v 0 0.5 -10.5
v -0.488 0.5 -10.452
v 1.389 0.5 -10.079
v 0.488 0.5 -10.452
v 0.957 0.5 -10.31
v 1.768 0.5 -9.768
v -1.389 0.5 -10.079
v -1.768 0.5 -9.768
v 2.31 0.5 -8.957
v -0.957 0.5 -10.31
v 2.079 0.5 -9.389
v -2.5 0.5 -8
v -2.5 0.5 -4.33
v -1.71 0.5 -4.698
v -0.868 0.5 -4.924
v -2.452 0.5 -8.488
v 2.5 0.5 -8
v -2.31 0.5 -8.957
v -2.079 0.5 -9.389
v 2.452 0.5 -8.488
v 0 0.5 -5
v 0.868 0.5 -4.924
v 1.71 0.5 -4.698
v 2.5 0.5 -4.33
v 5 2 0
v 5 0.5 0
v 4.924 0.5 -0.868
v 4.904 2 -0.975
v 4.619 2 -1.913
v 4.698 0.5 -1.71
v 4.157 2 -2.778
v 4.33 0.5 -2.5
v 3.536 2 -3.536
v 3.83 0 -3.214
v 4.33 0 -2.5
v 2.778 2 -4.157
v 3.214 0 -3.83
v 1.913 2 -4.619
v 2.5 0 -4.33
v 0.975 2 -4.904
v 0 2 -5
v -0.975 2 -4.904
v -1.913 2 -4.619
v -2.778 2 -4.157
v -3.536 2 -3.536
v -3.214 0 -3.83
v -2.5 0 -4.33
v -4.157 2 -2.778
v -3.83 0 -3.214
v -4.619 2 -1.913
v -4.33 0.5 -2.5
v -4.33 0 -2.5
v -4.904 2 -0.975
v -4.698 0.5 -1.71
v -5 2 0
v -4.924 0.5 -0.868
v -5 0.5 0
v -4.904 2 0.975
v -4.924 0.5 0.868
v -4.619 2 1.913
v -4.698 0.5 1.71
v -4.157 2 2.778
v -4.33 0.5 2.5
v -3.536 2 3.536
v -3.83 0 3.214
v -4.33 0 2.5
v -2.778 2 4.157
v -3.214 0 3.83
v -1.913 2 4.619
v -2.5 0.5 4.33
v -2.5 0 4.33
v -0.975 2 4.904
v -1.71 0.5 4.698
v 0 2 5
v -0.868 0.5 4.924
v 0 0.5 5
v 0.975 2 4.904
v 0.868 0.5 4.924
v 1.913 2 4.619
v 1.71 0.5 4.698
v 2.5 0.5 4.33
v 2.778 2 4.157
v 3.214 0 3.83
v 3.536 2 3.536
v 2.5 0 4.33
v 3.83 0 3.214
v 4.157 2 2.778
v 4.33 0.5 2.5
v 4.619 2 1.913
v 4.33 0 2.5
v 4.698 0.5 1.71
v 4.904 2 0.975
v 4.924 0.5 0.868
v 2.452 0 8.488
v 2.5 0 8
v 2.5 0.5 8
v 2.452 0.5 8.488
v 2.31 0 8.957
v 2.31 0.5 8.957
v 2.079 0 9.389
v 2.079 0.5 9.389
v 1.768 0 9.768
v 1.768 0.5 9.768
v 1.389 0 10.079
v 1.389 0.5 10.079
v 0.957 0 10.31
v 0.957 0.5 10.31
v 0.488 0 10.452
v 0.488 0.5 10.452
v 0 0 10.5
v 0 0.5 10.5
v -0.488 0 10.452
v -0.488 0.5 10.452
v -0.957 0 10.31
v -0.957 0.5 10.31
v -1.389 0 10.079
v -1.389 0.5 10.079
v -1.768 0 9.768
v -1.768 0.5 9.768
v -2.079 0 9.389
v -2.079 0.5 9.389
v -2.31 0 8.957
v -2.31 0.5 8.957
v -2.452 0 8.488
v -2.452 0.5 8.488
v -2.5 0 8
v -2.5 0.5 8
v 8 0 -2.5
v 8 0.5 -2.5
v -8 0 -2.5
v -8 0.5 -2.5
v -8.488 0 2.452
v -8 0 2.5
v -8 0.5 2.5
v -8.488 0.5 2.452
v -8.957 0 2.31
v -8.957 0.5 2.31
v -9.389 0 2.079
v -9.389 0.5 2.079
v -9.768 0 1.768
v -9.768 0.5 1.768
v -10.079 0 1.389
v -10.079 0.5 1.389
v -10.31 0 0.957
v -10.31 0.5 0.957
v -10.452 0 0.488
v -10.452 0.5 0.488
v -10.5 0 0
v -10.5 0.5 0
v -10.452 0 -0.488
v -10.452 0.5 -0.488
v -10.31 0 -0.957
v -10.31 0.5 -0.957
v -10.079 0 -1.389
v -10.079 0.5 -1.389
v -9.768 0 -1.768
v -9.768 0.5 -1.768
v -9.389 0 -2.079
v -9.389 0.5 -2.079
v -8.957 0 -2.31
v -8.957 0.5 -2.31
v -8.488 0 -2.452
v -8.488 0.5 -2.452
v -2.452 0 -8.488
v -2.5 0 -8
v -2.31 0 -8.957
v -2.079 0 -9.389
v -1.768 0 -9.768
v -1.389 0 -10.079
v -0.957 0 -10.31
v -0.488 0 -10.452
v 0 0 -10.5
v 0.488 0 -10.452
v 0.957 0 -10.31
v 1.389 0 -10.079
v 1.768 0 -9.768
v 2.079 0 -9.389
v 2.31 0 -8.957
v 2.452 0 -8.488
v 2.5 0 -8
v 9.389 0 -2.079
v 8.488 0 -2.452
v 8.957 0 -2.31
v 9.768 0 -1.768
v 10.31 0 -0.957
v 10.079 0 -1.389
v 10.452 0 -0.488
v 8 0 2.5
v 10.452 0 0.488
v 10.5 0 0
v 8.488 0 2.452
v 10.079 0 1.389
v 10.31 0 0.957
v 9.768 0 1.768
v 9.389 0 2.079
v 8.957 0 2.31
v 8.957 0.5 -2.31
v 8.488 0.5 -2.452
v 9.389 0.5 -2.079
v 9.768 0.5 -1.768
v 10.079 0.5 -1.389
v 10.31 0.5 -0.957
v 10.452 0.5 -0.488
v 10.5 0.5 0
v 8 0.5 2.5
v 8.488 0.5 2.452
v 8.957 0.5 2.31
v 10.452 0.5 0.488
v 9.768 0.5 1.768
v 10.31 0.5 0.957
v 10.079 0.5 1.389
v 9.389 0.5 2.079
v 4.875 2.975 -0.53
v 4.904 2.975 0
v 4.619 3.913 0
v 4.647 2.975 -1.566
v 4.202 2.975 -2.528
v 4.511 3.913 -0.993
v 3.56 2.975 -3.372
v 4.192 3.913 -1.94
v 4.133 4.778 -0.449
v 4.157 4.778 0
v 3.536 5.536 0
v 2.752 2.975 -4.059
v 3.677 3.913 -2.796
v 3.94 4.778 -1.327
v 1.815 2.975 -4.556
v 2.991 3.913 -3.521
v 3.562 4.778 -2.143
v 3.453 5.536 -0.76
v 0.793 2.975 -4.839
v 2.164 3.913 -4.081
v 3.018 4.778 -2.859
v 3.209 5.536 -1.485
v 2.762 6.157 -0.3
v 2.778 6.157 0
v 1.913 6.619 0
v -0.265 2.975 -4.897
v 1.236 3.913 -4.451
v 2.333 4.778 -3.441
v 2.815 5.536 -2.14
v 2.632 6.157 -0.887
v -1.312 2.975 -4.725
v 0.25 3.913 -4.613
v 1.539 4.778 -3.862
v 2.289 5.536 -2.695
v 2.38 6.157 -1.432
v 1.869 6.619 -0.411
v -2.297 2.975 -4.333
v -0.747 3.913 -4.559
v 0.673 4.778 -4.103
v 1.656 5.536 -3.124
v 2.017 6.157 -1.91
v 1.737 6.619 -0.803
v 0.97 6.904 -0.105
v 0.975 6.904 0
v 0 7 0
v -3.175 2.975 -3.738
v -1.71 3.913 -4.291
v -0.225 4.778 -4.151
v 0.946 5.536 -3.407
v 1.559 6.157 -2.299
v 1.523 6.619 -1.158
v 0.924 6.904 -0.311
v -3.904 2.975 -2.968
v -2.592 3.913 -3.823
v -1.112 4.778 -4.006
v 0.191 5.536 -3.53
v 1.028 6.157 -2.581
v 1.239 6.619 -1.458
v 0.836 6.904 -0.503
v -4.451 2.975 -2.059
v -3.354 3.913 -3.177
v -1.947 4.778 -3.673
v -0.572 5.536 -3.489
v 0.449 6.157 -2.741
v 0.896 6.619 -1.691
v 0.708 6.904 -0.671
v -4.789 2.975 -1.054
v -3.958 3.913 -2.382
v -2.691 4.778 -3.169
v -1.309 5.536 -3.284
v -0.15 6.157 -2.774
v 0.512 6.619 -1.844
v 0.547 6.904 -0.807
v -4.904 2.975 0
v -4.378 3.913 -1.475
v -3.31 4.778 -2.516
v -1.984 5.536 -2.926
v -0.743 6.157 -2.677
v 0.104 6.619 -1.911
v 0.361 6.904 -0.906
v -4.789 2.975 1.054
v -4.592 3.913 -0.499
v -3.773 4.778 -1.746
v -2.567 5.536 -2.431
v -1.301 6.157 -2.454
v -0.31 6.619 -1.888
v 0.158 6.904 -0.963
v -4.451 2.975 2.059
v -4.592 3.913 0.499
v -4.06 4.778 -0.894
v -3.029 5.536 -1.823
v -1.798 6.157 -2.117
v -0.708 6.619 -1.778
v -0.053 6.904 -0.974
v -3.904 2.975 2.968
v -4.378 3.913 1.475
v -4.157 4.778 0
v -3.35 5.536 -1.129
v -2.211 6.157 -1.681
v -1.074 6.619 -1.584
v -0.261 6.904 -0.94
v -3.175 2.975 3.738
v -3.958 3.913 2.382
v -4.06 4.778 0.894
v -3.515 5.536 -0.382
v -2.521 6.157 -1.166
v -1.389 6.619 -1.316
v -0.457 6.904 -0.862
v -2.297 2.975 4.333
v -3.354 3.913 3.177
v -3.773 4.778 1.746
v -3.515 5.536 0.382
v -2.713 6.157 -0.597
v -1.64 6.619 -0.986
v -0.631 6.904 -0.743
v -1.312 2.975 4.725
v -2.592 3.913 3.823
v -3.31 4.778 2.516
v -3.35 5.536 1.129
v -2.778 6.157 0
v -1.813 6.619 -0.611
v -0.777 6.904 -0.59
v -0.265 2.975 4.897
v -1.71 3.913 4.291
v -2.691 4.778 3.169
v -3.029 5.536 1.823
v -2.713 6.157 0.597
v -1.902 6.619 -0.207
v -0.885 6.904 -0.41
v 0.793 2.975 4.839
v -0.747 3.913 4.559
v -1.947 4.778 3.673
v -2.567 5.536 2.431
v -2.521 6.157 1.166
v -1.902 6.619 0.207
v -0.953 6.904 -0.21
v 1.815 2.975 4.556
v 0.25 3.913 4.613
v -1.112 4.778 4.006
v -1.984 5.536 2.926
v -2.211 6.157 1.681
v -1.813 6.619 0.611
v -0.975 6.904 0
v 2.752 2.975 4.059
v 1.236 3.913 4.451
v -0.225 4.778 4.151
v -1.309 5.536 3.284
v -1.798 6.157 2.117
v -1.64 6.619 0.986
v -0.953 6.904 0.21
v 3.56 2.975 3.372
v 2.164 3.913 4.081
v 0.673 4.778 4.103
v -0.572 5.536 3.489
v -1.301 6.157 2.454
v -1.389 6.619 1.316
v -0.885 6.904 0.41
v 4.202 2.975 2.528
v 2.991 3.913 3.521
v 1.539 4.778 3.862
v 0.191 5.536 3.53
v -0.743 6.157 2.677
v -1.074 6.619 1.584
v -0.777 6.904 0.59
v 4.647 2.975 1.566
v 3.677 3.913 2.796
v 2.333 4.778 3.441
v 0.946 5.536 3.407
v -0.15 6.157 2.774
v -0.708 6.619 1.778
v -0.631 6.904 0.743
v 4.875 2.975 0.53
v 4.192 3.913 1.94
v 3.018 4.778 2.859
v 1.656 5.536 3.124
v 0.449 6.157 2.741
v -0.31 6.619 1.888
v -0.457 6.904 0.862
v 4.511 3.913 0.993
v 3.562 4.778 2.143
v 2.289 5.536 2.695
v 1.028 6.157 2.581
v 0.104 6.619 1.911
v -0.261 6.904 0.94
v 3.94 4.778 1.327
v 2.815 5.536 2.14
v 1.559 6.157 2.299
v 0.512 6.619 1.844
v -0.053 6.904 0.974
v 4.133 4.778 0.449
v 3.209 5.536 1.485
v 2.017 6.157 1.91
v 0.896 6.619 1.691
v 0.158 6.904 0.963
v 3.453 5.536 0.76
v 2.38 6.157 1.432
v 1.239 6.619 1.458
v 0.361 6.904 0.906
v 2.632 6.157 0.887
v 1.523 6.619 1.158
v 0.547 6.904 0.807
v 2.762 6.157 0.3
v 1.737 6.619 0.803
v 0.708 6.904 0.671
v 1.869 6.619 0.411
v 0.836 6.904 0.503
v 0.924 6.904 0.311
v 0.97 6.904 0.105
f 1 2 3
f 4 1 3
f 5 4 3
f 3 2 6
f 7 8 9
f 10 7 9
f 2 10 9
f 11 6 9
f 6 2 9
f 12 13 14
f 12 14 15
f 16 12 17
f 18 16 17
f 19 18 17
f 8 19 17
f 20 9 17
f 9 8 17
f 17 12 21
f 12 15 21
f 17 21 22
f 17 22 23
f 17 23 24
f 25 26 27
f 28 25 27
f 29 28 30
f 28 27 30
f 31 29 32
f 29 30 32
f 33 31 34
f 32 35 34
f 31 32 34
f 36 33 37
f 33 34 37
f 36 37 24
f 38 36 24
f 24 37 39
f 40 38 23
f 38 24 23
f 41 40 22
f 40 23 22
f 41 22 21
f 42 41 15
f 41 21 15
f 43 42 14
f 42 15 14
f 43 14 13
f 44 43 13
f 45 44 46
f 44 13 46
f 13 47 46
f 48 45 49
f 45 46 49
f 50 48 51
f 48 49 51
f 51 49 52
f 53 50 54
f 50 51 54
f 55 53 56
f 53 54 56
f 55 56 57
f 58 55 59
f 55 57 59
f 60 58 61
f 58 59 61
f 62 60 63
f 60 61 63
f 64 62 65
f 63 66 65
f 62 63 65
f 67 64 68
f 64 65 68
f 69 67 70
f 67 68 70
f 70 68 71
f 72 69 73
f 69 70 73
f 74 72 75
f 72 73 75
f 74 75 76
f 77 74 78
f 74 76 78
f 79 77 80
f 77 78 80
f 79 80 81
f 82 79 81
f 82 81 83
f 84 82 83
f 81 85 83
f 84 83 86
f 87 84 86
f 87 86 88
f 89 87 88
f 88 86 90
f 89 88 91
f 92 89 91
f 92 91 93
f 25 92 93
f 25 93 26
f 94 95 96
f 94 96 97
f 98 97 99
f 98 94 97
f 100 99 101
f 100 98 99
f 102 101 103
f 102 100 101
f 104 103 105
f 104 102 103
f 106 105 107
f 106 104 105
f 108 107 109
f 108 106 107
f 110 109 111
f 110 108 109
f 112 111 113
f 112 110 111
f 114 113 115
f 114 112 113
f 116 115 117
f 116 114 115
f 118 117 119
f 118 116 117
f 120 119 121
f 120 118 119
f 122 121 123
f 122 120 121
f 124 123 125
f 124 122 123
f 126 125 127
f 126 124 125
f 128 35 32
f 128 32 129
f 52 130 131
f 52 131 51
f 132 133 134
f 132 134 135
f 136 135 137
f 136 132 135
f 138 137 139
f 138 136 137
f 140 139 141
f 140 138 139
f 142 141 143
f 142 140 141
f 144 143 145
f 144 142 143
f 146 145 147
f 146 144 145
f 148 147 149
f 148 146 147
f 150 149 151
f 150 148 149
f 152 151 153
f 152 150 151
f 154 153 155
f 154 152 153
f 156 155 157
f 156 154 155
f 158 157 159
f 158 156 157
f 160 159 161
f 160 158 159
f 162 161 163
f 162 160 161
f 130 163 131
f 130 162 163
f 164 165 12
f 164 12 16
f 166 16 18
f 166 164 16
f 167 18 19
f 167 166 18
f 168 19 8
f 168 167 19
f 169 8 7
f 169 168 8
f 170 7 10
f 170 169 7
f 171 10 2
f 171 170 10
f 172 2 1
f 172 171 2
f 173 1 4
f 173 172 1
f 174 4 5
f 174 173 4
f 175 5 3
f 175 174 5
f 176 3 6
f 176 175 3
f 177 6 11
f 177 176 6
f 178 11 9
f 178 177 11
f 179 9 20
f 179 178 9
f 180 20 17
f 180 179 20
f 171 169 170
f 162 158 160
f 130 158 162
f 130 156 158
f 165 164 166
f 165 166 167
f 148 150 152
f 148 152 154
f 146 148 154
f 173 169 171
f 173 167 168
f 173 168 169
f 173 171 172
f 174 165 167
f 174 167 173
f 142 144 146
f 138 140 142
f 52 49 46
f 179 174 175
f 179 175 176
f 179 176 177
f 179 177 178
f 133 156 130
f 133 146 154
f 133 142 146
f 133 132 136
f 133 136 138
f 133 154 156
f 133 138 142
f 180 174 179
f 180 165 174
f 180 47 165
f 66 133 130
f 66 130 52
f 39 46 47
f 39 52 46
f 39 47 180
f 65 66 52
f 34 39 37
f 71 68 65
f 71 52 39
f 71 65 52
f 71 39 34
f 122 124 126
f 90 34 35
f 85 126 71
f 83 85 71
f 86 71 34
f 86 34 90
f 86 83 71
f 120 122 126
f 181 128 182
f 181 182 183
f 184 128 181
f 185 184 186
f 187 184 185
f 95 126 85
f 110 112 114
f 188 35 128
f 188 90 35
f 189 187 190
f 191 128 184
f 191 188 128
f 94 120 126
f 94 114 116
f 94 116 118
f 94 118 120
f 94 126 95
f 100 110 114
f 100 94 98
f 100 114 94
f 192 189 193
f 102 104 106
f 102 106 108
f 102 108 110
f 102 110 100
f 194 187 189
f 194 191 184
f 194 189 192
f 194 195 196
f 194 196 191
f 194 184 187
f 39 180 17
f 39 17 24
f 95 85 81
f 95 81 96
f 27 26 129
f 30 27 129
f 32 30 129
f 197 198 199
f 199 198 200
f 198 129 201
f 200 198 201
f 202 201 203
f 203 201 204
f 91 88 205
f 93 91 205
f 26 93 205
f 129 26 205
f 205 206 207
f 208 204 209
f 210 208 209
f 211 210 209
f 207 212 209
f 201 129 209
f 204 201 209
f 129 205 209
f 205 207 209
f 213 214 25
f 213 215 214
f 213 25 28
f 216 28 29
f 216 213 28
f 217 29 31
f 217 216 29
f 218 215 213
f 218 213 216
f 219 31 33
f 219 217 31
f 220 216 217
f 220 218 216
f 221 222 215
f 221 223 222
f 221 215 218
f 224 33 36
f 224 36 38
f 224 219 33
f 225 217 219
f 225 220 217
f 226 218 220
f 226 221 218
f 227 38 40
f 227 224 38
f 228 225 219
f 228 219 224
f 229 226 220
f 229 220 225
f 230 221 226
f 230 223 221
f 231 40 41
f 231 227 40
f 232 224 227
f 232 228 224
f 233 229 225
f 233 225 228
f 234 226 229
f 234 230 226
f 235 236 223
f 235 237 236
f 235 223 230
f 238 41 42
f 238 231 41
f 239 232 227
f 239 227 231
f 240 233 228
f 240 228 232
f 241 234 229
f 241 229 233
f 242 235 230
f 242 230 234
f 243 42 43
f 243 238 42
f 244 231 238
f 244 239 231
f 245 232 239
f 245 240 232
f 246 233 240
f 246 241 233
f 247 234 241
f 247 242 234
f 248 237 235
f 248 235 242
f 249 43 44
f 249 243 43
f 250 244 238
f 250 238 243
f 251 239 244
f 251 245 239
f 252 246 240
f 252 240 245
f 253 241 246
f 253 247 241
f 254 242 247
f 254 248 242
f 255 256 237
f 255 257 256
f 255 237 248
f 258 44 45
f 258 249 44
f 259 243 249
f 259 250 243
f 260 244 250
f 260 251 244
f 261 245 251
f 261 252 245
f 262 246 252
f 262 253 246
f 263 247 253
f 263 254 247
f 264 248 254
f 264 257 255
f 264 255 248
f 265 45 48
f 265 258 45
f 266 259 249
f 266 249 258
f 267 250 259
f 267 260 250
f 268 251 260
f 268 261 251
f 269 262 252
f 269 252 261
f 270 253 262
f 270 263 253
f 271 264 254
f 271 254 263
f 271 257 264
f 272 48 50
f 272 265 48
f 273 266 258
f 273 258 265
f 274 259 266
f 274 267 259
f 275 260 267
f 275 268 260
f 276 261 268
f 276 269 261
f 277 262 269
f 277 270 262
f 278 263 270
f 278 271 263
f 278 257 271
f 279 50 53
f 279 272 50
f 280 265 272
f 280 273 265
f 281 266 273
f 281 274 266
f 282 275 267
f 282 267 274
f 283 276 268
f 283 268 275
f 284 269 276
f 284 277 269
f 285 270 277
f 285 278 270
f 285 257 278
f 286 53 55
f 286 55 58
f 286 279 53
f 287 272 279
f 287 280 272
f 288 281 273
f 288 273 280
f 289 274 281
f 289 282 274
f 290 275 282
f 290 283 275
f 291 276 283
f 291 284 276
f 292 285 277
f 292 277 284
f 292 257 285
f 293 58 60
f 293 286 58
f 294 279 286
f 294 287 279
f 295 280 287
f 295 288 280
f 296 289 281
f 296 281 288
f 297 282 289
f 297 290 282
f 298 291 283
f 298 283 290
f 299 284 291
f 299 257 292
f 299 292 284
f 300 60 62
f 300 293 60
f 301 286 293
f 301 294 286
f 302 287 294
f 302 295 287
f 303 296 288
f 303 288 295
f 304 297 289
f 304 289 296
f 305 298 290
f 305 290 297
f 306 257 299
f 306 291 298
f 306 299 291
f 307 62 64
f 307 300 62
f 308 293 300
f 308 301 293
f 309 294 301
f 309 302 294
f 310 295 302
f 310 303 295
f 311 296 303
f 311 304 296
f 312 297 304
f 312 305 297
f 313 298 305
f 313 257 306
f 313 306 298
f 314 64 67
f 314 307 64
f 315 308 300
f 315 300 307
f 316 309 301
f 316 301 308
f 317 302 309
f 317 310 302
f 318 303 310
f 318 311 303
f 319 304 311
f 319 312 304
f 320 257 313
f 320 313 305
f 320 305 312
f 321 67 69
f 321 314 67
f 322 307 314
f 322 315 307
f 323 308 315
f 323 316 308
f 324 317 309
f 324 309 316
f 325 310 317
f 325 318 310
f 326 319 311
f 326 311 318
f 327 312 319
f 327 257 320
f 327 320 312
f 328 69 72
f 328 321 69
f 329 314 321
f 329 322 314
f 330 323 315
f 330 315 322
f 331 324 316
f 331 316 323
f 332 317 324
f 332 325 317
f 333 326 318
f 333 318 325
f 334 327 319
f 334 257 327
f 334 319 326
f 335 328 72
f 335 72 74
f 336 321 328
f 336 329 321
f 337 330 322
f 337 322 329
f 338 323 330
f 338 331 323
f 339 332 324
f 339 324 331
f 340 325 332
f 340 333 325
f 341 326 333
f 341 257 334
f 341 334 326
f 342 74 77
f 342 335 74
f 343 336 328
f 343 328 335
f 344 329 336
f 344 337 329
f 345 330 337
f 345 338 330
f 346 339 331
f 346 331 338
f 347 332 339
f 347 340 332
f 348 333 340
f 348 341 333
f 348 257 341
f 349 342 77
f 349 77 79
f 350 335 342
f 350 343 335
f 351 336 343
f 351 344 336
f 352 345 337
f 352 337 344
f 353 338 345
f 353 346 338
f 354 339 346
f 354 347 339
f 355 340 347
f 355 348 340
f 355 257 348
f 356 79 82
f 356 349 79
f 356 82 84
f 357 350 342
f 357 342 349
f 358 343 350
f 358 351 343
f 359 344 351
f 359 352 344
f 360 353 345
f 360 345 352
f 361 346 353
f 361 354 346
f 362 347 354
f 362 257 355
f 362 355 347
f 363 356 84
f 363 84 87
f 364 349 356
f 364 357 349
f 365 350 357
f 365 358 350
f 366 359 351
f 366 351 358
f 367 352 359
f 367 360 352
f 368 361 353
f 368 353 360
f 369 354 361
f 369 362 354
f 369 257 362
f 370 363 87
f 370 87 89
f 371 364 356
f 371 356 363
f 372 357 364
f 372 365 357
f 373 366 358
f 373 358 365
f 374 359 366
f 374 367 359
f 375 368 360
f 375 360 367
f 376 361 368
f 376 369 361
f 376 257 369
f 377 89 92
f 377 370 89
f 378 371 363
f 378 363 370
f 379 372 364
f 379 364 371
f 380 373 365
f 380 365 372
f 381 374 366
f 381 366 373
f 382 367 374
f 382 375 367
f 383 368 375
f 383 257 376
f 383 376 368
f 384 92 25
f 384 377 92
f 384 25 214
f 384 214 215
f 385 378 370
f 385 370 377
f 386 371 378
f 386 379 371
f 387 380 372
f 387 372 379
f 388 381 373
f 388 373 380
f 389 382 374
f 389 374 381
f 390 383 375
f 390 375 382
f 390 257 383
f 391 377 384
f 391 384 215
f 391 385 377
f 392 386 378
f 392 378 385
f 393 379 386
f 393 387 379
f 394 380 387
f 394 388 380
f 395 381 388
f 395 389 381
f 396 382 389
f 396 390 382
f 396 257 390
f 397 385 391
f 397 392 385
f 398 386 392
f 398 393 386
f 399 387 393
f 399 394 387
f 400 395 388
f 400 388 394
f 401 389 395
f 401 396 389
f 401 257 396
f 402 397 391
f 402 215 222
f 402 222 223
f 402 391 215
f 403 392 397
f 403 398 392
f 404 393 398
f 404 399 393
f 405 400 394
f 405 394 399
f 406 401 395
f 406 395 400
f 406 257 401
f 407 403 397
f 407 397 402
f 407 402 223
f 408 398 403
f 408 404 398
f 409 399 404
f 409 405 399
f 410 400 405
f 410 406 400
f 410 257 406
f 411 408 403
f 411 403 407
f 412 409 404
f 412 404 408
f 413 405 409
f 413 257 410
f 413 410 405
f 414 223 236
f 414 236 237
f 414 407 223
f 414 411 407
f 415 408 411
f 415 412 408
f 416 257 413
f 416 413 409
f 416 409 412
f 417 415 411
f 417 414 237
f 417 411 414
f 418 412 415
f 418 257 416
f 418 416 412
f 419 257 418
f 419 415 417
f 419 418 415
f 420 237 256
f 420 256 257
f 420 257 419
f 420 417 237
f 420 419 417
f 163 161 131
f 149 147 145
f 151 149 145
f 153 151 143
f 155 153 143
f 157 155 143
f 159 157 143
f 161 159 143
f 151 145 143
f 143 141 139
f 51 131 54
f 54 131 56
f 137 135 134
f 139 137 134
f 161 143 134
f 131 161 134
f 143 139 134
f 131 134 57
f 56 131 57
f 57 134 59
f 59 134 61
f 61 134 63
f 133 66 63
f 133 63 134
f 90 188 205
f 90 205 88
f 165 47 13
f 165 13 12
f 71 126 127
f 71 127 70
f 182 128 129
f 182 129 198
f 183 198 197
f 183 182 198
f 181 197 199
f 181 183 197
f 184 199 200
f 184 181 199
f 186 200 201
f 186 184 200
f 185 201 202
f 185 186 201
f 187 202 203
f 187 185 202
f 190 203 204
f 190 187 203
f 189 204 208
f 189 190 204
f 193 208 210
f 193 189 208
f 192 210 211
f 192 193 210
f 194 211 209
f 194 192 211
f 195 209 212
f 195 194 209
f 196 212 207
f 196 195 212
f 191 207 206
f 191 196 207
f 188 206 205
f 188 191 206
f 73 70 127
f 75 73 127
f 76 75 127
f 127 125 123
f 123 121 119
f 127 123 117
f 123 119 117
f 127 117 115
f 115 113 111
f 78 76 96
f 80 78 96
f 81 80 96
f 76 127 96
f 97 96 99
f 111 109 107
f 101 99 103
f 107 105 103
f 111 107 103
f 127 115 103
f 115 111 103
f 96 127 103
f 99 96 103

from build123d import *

# Parameters (mm, degrees)
SKETCH1_R           = 5
BOSS_EXTRUDE1_DEPTH = 7
FILLET1_R           = 5
BOSS_EXTRU_1_DEPTH  = 0.5


with BuildPart() as part:
    # Sketch1 → Boss-Extrude1 (new body)
    with BuildSketch(Plane(origin=(0, 0, 0), x_dir=(1, 0, 0), z_dir=(0, 1, 0))):
        Circle(SKETCH1_R)
    extrude(amount=BOSS_EXTRUDE1_DEPTH)

    # Fillet1
    fillet1_edges = [part.edges().sort_by_distance(p)[0] for p in [
        (-5, 7, 0),
    ]]
    fillet(fillet1_edges, radius=FILLET1_R)

    # Esquisse1 → Boss.-Extru.1 (add)
    with BuildSketch(Plane.XZ):
        with BuildLine():
            Line((-2.5, 8), (-2.5, 4.330127019))
            ThreePointArc((-2.5, 4.330127019), (0, 5), (2.5, 4.330127019))
            Line((2.5, 4.330127019), (2.5, 8))
            ThreePointArc((2.5, 8), (0, 10.5), (-2.5, 8))
        make_face()
        with BuildLine():
            ThreePointArc((-4.330127019, -2.5), (-5, 0), (-4.330127019, 2.5))
            Line((-4.330127019, 2.5), (-8, 2.5))
            ThreePointArc((-8, 2.5), (-10.5, 0), (-8, -2.5))
            Line((-8, -2.5), (-4.330127019, -2.5))
        make_face()
        with BuildLine():
            Line((8, 2.5), (4.330127019, 2.5))
            ThreePointArc((4.330127019, 2.5), (5, 0), (4.330127019, -2.5))
            Line((4.330127019, -2.5), (8, -2.5))
            ThreePointArc((8, -2.5), (10.5, 0), (8, 2.5))
        make_face()
        with BuildLine():
            ThreePointArc((2.5, -4.330127019), (0, -5), (-2.5, -4.330127019))
            Line((-2.5, -4.330127019), (-2.5, -8))
            ThreePointArc((-2.5, -8), (0, -10.5), (2.5, -8))
            Line((2.5, -8), (2.5, -4.330127019))
        make_face()
    extrude(amount=-BOSS_EXTRU_1_DEPTH)


solid = part.part
